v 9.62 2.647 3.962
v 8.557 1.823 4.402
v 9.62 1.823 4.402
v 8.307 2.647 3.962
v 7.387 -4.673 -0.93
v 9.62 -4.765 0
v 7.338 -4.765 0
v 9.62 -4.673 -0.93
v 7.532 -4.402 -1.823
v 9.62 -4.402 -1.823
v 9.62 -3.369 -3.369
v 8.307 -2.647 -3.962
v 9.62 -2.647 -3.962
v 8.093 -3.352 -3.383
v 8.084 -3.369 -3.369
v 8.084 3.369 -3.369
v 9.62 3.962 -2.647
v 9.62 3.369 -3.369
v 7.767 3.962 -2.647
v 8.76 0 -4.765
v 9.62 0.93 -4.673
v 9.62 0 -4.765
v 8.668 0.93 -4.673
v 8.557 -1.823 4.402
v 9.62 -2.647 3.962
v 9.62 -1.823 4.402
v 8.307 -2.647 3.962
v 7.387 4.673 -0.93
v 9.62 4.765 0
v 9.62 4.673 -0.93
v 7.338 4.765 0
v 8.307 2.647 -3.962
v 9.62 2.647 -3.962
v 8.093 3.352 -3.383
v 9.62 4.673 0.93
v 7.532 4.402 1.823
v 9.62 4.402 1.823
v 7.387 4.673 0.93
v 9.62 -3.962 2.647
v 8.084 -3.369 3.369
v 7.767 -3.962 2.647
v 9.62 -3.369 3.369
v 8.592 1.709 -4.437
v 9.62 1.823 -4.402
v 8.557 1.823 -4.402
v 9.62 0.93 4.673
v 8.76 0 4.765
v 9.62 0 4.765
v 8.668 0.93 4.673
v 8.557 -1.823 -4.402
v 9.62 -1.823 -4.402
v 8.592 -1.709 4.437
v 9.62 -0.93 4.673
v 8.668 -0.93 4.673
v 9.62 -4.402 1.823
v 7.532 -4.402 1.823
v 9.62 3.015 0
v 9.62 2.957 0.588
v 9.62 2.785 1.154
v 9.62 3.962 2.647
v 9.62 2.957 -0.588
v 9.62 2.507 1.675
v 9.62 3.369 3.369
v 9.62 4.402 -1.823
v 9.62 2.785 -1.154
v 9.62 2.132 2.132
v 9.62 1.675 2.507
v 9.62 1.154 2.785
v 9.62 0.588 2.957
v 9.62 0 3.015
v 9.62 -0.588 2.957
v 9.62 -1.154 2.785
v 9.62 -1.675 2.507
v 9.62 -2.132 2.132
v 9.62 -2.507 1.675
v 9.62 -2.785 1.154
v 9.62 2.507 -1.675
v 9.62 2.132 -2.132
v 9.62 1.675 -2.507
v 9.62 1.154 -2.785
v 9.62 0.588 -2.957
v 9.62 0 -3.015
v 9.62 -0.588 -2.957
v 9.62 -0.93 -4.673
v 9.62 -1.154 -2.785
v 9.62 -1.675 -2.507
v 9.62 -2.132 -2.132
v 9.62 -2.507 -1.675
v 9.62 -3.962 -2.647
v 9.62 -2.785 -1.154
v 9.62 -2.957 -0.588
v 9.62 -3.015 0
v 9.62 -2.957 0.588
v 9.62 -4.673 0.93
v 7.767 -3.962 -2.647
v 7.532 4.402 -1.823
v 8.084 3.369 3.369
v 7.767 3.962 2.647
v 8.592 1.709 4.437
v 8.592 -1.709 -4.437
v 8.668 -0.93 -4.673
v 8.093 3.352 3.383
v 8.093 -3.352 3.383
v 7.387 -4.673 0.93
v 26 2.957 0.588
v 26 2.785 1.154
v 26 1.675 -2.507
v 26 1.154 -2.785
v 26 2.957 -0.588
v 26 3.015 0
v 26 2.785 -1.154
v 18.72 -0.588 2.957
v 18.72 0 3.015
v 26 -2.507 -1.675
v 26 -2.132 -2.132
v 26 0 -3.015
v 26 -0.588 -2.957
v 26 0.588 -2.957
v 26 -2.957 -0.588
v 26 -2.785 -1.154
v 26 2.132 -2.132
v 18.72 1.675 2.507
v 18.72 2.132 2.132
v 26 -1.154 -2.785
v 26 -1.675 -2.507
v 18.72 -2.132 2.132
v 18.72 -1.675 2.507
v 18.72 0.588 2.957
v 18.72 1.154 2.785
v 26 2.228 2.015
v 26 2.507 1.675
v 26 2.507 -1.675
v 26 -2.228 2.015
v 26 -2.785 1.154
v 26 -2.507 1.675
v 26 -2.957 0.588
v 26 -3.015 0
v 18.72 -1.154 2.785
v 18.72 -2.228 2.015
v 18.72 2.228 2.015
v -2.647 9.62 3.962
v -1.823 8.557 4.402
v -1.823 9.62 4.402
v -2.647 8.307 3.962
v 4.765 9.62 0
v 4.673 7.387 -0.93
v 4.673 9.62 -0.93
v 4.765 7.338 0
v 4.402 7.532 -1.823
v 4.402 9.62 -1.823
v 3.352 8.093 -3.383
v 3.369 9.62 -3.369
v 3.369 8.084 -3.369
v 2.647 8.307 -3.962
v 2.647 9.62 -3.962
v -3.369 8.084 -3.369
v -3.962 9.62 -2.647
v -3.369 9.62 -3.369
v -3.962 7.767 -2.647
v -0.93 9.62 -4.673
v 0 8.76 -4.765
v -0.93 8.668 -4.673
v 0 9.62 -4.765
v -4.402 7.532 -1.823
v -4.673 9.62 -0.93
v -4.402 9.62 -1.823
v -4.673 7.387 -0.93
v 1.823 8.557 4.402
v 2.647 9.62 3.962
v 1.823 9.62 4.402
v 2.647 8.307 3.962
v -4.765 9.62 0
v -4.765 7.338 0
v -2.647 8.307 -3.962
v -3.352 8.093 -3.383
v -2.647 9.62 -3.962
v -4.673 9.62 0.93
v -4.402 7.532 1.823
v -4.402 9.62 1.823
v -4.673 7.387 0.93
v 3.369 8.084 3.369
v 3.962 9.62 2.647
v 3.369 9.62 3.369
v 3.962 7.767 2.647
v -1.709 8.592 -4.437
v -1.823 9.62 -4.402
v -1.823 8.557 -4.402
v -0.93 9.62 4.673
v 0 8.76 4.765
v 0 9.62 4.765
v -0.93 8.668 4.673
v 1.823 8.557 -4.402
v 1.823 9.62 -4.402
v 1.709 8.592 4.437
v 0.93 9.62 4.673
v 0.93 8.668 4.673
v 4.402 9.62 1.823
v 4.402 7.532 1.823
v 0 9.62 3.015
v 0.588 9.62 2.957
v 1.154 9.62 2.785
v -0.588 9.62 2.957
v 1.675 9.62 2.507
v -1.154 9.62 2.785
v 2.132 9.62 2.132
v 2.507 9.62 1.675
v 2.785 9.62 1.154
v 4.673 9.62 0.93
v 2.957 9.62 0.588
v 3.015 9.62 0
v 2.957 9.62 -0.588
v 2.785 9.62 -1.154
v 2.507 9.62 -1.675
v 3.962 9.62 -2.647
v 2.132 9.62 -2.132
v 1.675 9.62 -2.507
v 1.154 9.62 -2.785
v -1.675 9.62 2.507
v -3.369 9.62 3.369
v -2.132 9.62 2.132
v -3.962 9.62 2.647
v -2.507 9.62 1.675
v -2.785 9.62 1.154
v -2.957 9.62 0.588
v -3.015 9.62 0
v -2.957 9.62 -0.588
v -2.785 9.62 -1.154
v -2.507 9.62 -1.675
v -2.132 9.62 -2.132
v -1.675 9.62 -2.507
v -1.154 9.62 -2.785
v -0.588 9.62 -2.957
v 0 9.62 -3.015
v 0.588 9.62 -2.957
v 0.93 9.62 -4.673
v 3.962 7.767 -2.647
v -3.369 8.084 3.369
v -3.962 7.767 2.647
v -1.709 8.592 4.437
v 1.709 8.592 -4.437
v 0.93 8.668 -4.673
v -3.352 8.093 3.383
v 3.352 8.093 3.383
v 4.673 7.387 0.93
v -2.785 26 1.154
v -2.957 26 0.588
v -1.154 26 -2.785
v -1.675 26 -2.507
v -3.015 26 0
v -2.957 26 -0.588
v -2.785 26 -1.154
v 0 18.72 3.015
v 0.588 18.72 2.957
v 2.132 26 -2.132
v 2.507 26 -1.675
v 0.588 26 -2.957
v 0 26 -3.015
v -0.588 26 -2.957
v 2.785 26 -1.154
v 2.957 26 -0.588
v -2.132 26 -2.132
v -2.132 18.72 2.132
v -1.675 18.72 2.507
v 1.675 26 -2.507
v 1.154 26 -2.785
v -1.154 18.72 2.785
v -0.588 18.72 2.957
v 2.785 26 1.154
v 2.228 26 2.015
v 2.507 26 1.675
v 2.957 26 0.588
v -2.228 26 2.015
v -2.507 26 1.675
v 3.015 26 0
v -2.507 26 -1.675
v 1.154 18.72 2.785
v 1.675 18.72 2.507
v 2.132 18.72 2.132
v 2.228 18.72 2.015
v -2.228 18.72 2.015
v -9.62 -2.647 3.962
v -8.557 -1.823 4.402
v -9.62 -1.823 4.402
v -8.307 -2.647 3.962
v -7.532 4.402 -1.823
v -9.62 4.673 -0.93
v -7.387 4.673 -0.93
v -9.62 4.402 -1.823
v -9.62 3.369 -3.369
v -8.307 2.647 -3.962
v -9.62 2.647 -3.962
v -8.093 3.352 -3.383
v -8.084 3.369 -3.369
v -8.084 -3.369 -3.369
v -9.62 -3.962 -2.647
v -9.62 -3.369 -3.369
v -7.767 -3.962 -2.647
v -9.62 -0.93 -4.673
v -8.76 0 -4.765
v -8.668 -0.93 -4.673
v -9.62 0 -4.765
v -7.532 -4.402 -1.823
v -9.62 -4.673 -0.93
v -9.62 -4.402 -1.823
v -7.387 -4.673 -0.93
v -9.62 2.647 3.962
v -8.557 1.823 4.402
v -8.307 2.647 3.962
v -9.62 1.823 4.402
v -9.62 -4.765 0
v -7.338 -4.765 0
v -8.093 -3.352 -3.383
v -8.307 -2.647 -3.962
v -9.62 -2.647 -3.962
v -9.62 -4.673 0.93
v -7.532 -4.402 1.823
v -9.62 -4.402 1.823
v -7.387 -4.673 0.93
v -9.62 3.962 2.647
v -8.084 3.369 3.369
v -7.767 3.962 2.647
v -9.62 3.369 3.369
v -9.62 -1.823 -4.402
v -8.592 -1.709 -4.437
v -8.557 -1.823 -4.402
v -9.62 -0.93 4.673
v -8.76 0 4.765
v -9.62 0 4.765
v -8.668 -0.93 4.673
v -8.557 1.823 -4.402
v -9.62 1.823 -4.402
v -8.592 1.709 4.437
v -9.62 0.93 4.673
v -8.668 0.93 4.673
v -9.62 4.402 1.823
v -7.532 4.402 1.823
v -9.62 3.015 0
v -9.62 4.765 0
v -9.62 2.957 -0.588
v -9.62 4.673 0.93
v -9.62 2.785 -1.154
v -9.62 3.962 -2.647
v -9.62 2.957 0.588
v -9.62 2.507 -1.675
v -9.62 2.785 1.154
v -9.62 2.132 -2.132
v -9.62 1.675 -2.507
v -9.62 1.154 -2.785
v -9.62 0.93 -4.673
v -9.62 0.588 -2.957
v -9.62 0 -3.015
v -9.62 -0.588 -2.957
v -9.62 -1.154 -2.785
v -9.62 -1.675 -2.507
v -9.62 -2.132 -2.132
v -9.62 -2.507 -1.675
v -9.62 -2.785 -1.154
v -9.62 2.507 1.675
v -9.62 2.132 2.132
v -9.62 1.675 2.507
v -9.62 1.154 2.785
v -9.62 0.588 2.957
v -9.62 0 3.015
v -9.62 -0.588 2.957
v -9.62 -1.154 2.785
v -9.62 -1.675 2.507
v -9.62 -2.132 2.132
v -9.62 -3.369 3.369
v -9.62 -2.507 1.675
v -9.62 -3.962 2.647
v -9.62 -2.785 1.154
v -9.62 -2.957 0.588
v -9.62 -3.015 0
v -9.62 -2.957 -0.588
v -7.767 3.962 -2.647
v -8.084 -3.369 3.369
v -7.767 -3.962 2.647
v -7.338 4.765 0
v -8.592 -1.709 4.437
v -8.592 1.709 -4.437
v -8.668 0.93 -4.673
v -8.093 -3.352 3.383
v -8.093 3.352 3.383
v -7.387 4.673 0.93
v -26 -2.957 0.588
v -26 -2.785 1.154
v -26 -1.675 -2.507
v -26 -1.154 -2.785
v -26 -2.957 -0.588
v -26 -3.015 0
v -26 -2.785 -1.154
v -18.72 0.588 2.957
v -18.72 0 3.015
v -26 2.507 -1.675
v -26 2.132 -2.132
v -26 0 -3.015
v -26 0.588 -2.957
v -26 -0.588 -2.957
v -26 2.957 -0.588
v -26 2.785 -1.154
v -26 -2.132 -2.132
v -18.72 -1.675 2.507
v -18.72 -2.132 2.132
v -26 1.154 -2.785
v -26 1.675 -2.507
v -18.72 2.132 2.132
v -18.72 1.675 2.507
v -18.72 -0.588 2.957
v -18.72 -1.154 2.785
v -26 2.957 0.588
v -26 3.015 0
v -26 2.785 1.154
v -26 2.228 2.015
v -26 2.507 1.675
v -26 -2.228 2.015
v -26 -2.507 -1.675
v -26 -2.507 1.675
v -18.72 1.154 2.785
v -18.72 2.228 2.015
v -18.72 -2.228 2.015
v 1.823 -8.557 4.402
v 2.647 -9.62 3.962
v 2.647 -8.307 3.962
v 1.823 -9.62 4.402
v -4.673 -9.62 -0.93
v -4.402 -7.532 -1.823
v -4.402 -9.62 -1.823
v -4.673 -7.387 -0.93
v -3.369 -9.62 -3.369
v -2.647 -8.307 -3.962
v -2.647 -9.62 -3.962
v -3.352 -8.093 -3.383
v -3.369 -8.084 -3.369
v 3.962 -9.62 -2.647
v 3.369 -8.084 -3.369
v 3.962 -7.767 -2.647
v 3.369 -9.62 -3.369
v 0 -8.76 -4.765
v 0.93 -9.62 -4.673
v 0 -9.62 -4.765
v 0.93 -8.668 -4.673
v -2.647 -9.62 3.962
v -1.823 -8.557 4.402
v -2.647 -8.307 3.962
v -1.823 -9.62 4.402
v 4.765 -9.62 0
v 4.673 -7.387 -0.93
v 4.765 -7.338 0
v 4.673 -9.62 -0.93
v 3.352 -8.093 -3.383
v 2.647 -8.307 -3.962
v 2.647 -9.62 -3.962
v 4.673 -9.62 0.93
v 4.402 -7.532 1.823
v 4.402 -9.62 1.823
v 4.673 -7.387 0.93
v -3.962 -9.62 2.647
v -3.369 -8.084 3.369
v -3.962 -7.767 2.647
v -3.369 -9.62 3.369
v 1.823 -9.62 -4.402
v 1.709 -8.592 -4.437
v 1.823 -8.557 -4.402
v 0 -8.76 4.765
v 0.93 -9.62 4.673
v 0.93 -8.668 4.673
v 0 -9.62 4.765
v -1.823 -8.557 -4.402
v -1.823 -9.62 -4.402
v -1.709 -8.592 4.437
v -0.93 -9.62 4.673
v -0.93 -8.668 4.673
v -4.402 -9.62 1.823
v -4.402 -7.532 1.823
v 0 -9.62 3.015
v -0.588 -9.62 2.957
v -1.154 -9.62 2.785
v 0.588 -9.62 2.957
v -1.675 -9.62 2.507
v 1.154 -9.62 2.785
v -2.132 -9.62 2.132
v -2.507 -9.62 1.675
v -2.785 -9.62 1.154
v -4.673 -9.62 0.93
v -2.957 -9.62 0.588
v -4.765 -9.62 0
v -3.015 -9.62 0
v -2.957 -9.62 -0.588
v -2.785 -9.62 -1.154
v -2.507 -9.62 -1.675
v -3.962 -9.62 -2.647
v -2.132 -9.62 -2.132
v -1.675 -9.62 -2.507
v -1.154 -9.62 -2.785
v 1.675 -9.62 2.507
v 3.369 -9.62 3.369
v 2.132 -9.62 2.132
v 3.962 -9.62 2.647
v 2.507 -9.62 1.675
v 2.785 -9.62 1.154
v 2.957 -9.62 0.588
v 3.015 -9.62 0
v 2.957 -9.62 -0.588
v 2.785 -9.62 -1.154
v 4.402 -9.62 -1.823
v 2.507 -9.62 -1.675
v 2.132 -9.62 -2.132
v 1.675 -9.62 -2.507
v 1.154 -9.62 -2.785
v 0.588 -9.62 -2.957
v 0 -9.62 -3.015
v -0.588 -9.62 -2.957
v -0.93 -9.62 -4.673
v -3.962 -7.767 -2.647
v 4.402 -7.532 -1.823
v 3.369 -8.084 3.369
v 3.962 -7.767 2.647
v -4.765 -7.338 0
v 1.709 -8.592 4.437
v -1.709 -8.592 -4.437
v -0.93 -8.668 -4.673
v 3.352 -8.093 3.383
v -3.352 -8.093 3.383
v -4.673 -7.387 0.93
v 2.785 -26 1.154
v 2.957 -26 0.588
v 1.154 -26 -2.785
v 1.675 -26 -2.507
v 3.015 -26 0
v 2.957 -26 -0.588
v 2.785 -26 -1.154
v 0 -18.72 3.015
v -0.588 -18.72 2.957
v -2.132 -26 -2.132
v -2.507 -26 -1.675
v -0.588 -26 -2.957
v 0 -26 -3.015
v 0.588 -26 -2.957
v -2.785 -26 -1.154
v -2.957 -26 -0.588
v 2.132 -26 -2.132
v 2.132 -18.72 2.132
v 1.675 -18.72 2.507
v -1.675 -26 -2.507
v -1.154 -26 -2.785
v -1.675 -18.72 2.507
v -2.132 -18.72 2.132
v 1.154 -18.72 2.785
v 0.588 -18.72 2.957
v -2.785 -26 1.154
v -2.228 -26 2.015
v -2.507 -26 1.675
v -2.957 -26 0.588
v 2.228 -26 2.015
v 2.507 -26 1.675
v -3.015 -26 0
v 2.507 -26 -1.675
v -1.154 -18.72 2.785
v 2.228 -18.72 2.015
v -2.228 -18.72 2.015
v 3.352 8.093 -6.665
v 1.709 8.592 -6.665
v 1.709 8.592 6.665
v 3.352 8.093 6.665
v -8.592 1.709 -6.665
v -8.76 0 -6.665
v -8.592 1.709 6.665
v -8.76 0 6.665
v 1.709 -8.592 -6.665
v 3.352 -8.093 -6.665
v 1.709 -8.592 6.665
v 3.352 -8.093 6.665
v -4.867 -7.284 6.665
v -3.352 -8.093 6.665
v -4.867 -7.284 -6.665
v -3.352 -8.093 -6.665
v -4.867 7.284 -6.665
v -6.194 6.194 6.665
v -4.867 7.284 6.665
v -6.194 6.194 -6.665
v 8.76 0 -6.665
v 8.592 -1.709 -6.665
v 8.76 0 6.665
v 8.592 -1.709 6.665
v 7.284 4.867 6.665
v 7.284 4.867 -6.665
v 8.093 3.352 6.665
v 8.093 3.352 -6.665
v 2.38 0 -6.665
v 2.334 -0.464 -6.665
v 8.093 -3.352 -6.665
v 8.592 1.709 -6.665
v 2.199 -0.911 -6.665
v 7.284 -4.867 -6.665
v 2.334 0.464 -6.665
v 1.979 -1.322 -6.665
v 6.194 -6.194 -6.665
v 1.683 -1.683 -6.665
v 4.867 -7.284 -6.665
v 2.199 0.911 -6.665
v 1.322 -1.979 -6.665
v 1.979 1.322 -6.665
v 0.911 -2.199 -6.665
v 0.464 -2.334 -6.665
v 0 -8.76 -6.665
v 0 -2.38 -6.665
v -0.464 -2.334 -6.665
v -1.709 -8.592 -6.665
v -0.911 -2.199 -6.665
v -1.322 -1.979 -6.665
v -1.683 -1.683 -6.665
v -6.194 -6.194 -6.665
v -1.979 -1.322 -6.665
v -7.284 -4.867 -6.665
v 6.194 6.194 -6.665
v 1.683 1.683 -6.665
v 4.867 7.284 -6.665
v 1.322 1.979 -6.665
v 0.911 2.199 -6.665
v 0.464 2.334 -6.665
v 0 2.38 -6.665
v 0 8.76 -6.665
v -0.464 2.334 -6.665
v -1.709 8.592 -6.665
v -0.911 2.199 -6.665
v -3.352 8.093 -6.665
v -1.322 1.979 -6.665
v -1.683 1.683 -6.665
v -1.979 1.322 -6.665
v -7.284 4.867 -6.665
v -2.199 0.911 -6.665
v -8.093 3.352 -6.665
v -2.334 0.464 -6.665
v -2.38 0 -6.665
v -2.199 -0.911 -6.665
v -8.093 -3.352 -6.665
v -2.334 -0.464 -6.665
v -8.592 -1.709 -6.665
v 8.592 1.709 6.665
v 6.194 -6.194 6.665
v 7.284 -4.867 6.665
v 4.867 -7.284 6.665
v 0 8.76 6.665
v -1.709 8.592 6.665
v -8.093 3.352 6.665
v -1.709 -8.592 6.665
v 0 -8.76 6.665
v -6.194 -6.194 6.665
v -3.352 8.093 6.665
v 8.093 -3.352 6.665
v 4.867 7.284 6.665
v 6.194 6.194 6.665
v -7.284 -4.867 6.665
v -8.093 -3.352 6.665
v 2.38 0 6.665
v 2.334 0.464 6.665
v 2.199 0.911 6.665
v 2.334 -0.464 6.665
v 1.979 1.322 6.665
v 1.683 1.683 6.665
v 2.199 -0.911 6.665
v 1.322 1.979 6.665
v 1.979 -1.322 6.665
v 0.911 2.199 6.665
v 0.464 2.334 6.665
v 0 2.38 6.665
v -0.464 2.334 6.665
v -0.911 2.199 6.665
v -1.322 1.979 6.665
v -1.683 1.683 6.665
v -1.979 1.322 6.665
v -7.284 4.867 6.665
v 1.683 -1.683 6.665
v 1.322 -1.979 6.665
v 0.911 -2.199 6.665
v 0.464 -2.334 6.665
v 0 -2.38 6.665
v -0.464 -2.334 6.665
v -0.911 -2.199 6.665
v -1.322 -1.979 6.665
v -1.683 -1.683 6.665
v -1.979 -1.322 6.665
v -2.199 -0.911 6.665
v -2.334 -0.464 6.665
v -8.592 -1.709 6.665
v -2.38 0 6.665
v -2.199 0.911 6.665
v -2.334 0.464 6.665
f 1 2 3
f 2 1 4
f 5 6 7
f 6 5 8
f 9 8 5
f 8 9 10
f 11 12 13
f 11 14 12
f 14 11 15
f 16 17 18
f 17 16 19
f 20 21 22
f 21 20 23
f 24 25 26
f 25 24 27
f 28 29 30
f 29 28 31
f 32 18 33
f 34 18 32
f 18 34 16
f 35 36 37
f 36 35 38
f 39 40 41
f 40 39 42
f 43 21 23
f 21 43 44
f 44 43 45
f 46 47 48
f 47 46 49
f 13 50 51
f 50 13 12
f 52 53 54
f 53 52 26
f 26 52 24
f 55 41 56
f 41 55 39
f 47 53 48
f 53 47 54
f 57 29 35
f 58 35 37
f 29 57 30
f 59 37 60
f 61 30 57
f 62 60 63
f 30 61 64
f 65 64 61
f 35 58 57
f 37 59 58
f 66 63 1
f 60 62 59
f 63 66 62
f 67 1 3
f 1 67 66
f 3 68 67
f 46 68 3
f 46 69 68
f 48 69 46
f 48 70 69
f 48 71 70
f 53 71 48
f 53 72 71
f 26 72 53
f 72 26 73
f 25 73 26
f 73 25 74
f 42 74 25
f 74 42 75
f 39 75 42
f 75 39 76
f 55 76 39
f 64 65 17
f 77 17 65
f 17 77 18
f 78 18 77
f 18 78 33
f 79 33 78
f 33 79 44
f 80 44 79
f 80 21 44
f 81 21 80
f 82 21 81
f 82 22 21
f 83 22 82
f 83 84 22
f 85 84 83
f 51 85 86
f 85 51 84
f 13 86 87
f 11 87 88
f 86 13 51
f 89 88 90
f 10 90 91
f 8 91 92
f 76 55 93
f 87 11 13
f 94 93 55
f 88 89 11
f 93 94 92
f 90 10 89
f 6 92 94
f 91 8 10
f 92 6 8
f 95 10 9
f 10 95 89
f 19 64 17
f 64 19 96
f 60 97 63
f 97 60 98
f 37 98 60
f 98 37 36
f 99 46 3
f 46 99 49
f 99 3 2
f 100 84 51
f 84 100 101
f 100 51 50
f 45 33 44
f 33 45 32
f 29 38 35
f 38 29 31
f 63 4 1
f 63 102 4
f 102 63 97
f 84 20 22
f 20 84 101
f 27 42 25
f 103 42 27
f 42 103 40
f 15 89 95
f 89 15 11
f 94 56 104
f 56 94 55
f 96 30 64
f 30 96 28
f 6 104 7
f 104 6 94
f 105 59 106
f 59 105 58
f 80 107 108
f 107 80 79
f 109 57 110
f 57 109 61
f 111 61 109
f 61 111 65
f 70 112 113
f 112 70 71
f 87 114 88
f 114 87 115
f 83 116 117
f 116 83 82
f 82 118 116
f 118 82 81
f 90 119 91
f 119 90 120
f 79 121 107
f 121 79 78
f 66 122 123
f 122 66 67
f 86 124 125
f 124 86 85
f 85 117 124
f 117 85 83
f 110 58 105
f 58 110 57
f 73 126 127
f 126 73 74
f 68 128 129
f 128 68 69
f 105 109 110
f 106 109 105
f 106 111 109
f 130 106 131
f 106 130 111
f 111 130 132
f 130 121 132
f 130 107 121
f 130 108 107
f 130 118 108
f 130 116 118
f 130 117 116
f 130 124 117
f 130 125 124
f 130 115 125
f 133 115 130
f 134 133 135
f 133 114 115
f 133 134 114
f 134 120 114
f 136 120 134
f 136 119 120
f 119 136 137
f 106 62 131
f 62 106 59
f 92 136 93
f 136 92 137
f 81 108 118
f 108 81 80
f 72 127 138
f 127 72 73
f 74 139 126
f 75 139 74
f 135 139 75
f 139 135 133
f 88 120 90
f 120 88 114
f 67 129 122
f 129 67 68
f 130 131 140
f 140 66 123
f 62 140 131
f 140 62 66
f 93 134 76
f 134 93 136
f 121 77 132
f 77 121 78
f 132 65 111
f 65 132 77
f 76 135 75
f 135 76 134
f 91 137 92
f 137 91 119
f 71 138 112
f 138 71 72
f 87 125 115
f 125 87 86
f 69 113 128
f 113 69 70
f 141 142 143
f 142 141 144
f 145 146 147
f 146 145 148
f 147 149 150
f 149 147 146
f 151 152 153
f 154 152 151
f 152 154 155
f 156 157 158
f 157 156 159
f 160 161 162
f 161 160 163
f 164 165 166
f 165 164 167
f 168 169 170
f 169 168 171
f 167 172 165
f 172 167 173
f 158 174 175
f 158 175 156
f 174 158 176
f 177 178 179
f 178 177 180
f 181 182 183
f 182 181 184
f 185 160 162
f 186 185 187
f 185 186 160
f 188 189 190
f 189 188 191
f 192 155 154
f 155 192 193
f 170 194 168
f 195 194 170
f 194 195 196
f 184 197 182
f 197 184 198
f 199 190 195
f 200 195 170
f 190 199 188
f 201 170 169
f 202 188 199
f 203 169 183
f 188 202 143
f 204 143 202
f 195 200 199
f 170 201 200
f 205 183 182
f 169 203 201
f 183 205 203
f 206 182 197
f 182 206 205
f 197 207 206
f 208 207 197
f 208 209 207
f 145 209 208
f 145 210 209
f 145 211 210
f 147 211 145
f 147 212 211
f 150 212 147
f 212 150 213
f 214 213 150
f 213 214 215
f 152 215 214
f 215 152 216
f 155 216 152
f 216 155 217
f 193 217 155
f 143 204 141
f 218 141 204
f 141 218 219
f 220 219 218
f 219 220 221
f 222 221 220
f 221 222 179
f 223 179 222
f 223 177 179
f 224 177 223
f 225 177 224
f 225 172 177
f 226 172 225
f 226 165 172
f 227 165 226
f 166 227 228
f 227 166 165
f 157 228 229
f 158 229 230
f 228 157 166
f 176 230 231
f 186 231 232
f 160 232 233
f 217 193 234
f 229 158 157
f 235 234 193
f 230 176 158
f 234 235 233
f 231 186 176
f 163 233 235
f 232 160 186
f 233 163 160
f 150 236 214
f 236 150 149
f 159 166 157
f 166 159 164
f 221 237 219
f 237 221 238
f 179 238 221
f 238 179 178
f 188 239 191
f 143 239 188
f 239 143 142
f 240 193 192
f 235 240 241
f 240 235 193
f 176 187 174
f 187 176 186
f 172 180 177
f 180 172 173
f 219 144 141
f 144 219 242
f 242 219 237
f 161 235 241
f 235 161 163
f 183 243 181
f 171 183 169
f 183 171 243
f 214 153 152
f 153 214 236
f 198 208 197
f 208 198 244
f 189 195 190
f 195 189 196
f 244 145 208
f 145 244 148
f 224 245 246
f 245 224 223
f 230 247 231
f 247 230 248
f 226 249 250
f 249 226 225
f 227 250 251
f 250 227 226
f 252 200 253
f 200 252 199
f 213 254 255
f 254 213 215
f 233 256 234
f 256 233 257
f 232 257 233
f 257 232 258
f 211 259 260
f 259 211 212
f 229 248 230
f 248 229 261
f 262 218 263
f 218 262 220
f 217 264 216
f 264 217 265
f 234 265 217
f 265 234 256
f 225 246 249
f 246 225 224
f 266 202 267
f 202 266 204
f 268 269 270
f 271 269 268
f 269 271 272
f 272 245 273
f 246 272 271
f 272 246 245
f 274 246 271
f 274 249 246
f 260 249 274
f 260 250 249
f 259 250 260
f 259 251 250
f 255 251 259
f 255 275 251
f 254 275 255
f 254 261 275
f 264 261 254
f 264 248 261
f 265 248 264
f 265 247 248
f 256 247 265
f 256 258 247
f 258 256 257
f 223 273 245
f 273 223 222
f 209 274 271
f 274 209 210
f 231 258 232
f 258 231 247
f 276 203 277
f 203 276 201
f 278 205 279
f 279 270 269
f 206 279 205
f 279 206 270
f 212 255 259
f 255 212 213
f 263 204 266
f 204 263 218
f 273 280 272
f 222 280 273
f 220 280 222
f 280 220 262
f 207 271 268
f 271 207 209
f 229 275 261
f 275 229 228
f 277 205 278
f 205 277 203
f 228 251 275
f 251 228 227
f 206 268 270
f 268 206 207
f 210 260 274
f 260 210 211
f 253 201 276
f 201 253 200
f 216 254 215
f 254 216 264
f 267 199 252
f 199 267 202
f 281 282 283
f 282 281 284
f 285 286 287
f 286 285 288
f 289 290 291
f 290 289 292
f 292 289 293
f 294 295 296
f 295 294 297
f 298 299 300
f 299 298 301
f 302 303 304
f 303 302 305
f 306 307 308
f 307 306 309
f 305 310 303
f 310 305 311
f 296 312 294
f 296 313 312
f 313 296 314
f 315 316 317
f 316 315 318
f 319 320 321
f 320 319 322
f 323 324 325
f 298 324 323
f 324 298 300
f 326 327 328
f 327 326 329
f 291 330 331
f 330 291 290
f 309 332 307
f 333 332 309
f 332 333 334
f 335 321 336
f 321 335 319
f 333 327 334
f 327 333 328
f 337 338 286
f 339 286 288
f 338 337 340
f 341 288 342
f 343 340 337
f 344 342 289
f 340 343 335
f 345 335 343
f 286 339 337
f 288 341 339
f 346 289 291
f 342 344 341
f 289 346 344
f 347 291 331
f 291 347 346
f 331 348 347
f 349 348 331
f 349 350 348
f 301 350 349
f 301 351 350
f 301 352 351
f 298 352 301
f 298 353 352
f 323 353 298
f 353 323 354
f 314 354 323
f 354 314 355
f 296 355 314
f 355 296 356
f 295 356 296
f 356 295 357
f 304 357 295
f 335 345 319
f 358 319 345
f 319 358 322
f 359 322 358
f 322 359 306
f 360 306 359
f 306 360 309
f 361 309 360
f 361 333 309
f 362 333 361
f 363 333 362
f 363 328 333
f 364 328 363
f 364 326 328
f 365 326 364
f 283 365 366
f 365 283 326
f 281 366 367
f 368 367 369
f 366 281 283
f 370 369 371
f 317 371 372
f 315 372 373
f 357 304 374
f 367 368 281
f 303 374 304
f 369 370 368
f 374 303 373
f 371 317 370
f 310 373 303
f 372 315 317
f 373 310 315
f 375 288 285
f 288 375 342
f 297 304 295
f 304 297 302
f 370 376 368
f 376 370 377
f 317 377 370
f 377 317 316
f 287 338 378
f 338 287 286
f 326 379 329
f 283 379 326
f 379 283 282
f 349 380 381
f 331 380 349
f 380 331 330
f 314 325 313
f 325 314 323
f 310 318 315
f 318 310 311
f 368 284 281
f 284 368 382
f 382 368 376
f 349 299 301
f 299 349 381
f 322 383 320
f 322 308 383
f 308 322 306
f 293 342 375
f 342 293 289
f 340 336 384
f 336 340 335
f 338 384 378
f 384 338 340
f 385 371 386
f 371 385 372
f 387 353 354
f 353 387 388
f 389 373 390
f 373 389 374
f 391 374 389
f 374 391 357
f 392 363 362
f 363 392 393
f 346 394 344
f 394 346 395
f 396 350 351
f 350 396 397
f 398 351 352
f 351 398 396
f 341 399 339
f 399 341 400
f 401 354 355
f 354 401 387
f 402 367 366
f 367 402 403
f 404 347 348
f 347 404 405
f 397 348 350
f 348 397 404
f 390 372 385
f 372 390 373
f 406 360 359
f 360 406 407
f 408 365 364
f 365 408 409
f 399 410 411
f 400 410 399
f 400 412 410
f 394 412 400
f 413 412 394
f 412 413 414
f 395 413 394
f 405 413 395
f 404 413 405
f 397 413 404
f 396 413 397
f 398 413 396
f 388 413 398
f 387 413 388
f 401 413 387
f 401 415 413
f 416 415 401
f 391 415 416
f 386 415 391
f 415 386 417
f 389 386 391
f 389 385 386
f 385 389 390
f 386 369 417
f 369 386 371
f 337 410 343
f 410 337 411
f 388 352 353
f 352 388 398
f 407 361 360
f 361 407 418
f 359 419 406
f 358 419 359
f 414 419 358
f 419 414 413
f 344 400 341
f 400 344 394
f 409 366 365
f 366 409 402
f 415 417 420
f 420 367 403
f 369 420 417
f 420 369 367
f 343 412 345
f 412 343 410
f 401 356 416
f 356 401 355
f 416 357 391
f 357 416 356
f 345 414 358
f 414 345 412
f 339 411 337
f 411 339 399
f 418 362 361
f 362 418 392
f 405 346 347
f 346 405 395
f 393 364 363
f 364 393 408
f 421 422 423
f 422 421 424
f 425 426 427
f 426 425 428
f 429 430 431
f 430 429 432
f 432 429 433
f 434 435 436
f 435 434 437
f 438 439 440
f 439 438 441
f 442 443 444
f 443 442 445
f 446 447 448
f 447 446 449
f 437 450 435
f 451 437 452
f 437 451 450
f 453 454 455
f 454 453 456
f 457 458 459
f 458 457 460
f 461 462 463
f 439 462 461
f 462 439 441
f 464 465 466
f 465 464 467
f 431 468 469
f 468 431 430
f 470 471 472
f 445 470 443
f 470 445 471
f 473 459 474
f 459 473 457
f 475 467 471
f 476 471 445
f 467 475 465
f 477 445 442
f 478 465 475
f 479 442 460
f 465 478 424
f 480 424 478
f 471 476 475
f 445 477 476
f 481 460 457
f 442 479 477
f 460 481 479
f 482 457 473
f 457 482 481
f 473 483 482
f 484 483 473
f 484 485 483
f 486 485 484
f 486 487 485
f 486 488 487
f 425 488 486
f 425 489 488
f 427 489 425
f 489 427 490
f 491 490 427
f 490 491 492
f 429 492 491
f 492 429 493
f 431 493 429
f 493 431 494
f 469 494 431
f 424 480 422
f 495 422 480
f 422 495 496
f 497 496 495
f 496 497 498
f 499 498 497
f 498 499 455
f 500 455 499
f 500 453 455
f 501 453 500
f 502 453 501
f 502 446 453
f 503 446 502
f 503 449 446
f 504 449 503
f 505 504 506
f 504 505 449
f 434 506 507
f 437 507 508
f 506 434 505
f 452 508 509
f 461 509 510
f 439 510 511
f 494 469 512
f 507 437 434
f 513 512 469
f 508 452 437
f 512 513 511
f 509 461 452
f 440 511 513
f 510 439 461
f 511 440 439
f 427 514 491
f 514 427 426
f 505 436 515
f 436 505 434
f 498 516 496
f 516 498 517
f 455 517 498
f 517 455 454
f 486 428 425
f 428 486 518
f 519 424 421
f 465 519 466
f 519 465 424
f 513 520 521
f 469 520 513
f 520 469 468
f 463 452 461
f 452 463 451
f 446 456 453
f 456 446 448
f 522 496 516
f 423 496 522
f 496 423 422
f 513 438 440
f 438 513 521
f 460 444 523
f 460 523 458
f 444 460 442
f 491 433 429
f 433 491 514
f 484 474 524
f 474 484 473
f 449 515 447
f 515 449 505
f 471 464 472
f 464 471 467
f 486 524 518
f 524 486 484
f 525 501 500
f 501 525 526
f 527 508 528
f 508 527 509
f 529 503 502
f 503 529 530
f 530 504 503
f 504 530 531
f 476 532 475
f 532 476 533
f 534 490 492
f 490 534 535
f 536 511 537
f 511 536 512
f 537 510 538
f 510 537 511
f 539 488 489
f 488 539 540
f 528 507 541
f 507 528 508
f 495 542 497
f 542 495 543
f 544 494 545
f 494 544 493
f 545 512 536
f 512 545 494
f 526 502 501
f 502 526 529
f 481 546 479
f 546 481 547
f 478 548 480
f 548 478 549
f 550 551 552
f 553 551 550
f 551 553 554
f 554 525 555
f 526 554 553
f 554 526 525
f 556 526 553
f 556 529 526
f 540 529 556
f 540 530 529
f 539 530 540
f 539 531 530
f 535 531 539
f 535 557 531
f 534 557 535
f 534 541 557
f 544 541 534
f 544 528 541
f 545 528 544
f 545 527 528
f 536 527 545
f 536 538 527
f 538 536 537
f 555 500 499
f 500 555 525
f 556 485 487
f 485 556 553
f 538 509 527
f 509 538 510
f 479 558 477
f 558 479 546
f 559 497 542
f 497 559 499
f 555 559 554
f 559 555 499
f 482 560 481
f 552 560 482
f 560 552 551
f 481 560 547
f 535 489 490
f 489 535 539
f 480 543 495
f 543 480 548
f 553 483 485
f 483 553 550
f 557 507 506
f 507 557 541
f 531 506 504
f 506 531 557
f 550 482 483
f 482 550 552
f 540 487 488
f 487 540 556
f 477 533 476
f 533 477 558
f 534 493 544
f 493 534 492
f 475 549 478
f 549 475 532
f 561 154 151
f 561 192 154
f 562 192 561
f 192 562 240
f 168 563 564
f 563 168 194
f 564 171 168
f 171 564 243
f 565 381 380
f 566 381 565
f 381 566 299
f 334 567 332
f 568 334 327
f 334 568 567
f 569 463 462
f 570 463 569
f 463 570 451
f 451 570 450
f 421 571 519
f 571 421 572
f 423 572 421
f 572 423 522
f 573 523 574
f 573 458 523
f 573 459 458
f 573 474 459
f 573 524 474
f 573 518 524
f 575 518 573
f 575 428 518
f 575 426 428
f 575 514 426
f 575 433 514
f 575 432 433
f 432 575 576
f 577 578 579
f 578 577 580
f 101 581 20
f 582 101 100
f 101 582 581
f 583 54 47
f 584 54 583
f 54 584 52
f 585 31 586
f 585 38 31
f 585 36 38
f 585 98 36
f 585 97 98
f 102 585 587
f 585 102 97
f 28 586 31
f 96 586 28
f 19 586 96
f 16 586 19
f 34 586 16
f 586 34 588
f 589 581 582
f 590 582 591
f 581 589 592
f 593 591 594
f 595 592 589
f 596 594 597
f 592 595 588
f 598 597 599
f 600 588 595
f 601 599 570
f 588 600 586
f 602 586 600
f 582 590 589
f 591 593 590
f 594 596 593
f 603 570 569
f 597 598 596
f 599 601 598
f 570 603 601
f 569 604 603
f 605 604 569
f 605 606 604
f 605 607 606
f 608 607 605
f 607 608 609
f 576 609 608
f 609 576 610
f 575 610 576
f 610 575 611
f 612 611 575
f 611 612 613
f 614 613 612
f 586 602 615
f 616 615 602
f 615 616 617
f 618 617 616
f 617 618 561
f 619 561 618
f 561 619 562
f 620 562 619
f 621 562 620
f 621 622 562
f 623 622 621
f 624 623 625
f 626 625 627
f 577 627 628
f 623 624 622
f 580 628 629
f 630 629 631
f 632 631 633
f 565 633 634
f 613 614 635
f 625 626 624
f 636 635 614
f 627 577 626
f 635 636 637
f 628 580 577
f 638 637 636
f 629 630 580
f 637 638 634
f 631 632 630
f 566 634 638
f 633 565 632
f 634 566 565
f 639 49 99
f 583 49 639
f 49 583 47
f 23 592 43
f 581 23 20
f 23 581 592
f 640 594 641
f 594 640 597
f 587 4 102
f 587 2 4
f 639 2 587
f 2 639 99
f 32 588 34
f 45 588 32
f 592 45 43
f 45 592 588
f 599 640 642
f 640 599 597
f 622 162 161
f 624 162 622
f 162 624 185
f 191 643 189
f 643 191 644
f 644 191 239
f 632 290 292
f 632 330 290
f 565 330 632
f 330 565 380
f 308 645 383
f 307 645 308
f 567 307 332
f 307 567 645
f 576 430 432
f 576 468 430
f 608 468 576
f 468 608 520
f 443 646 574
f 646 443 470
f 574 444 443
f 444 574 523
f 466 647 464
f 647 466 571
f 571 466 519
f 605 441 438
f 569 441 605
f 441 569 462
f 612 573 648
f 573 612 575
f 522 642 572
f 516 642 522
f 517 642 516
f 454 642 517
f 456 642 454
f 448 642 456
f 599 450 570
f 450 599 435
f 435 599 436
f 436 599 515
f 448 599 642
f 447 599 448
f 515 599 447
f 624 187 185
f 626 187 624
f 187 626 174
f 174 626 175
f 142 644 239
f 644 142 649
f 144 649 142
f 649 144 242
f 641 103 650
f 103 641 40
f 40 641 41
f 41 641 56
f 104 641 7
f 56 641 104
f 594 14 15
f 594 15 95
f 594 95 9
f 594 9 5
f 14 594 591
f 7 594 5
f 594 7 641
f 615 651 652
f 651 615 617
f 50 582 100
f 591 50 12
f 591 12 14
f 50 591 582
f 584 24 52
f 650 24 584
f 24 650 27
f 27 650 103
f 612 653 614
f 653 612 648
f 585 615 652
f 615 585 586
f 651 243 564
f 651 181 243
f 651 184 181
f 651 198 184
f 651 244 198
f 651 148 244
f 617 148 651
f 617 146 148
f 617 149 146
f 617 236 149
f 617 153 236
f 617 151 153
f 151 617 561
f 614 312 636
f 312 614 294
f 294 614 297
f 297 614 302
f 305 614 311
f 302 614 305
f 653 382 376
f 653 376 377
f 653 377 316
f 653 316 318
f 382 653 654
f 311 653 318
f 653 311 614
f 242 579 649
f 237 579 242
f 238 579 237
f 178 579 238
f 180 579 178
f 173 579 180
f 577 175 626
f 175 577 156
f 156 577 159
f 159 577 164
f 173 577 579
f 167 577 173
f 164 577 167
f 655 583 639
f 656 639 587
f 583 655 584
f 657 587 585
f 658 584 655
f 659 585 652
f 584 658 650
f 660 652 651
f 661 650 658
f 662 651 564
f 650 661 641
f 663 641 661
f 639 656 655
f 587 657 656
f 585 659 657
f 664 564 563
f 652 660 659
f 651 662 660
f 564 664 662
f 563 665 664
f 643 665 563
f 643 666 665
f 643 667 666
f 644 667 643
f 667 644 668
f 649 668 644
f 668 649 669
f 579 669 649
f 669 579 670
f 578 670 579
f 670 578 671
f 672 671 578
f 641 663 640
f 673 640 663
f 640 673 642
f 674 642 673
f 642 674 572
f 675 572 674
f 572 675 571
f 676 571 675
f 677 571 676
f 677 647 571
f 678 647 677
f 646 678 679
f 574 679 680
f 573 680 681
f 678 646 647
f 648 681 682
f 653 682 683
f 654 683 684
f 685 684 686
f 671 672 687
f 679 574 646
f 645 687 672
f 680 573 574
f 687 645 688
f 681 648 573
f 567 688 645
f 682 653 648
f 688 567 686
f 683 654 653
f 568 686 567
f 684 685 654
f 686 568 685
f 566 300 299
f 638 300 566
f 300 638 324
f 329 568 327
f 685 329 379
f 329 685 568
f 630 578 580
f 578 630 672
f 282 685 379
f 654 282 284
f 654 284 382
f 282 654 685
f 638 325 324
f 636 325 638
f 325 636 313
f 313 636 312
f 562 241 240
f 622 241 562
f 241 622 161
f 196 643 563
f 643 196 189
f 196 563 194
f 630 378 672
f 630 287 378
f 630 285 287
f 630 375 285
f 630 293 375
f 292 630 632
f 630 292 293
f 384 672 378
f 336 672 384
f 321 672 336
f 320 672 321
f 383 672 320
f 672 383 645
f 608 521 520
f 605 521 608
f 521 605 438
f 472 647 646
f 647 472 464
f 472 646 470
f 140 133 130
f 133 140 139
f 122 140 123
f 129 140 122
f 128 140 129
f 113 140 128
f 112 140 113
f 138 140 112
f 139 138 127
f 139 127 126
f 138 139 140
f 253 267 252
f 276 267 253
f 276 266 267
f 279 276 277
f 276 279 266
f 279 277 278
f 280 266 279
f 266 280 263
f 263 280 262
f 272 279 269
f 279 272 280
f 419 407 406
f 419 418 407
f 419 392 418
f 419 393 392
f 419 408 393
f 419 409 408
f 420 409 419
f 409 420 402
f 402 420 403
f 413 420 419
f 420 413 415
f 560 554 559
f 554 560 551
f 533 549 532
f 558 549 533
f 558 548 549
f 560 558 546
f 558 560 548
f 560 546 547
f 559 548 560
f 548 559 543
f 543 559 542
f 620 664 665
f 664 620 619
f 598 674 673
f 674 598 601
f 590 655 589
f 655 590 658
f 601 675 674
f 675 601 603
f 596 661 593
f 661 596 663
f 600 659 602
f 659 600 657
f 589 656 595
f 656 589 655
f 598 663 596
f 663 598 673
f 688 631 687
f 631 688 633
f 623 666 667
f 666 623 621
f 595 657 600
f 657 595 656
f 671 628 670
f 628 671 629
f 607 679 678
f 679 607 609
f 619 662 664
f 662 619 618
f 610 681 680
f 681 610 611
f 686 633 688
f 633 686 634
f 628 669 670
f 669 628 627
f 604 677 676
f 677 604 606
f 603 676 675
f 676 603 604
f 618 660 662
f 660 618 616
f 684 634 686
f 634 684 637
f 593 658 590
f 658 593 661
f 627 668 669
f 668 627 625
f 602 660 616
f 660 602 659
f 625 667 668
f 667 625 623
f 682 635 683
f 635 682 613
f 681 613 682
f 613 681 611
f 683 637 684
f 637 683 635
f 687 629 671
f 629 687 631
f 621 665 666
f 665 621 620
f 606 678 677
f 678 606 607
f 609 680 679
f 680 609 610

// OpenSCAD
$fn = 32;

// ----------------------------------------------------------------------
// Cardan cross: 52 mm span, 9.53 mm trunnions
// ----------------------------------------------------------------------

// --- parameters (mm) ---
journal_d = 9.53;         // trunnion diameter
arm_len = 26;             // trunnion length from the centre
step_r = 3.24;            // step position from the centre
step_d = 6.03;            // journal diameter after the step
hub_d = 17.52;            // hub diameter
hub_h = 13.33;            // hub height
bore_d = 4.76;            // hub bore
flat_d = 1;               // depth of the journal flat
flat_len = 7.28;          // length of the journal flat

difference() {
  union() {
    /* hub along the joint axis */
    cylinder(h = hub_h, d = hub_d, center = true);
    for (a = [0 : 90 : 270]) rotate([0, 0, a]) {
      /* trunnion, sunk into the hub */
      translate([hub_d / 4, 0, 0]) rotate([0, 90, 0]) cylinder(h = step_r + 2, d = journal_d);
      /* stepped journal out to the tip */
      translate([step_r - 0.5, 0, 0]) rotate([0, 90, 0]) cylinder(h = arm_len + 0.5 - step_r, d = step_d);
    }
  }
  /* lubrication bore through the hub, 2.5 mm clear on both sides */
  translate([0, 0, -hub_h / 2 - 2.5]) cylinder(h = hub_h + 5, d = bore_d);
  /* machined flat on each journal tip */
  for (a = [0 : 90 : 270]) rotate([0, 0, a]) {
    translate([arm_len - flat_len, -step_d, step_d / 2 - flat_d]) cube([flat_len + 0.5, 2 * step_d, flat_d + 2.5]);
  }
}
